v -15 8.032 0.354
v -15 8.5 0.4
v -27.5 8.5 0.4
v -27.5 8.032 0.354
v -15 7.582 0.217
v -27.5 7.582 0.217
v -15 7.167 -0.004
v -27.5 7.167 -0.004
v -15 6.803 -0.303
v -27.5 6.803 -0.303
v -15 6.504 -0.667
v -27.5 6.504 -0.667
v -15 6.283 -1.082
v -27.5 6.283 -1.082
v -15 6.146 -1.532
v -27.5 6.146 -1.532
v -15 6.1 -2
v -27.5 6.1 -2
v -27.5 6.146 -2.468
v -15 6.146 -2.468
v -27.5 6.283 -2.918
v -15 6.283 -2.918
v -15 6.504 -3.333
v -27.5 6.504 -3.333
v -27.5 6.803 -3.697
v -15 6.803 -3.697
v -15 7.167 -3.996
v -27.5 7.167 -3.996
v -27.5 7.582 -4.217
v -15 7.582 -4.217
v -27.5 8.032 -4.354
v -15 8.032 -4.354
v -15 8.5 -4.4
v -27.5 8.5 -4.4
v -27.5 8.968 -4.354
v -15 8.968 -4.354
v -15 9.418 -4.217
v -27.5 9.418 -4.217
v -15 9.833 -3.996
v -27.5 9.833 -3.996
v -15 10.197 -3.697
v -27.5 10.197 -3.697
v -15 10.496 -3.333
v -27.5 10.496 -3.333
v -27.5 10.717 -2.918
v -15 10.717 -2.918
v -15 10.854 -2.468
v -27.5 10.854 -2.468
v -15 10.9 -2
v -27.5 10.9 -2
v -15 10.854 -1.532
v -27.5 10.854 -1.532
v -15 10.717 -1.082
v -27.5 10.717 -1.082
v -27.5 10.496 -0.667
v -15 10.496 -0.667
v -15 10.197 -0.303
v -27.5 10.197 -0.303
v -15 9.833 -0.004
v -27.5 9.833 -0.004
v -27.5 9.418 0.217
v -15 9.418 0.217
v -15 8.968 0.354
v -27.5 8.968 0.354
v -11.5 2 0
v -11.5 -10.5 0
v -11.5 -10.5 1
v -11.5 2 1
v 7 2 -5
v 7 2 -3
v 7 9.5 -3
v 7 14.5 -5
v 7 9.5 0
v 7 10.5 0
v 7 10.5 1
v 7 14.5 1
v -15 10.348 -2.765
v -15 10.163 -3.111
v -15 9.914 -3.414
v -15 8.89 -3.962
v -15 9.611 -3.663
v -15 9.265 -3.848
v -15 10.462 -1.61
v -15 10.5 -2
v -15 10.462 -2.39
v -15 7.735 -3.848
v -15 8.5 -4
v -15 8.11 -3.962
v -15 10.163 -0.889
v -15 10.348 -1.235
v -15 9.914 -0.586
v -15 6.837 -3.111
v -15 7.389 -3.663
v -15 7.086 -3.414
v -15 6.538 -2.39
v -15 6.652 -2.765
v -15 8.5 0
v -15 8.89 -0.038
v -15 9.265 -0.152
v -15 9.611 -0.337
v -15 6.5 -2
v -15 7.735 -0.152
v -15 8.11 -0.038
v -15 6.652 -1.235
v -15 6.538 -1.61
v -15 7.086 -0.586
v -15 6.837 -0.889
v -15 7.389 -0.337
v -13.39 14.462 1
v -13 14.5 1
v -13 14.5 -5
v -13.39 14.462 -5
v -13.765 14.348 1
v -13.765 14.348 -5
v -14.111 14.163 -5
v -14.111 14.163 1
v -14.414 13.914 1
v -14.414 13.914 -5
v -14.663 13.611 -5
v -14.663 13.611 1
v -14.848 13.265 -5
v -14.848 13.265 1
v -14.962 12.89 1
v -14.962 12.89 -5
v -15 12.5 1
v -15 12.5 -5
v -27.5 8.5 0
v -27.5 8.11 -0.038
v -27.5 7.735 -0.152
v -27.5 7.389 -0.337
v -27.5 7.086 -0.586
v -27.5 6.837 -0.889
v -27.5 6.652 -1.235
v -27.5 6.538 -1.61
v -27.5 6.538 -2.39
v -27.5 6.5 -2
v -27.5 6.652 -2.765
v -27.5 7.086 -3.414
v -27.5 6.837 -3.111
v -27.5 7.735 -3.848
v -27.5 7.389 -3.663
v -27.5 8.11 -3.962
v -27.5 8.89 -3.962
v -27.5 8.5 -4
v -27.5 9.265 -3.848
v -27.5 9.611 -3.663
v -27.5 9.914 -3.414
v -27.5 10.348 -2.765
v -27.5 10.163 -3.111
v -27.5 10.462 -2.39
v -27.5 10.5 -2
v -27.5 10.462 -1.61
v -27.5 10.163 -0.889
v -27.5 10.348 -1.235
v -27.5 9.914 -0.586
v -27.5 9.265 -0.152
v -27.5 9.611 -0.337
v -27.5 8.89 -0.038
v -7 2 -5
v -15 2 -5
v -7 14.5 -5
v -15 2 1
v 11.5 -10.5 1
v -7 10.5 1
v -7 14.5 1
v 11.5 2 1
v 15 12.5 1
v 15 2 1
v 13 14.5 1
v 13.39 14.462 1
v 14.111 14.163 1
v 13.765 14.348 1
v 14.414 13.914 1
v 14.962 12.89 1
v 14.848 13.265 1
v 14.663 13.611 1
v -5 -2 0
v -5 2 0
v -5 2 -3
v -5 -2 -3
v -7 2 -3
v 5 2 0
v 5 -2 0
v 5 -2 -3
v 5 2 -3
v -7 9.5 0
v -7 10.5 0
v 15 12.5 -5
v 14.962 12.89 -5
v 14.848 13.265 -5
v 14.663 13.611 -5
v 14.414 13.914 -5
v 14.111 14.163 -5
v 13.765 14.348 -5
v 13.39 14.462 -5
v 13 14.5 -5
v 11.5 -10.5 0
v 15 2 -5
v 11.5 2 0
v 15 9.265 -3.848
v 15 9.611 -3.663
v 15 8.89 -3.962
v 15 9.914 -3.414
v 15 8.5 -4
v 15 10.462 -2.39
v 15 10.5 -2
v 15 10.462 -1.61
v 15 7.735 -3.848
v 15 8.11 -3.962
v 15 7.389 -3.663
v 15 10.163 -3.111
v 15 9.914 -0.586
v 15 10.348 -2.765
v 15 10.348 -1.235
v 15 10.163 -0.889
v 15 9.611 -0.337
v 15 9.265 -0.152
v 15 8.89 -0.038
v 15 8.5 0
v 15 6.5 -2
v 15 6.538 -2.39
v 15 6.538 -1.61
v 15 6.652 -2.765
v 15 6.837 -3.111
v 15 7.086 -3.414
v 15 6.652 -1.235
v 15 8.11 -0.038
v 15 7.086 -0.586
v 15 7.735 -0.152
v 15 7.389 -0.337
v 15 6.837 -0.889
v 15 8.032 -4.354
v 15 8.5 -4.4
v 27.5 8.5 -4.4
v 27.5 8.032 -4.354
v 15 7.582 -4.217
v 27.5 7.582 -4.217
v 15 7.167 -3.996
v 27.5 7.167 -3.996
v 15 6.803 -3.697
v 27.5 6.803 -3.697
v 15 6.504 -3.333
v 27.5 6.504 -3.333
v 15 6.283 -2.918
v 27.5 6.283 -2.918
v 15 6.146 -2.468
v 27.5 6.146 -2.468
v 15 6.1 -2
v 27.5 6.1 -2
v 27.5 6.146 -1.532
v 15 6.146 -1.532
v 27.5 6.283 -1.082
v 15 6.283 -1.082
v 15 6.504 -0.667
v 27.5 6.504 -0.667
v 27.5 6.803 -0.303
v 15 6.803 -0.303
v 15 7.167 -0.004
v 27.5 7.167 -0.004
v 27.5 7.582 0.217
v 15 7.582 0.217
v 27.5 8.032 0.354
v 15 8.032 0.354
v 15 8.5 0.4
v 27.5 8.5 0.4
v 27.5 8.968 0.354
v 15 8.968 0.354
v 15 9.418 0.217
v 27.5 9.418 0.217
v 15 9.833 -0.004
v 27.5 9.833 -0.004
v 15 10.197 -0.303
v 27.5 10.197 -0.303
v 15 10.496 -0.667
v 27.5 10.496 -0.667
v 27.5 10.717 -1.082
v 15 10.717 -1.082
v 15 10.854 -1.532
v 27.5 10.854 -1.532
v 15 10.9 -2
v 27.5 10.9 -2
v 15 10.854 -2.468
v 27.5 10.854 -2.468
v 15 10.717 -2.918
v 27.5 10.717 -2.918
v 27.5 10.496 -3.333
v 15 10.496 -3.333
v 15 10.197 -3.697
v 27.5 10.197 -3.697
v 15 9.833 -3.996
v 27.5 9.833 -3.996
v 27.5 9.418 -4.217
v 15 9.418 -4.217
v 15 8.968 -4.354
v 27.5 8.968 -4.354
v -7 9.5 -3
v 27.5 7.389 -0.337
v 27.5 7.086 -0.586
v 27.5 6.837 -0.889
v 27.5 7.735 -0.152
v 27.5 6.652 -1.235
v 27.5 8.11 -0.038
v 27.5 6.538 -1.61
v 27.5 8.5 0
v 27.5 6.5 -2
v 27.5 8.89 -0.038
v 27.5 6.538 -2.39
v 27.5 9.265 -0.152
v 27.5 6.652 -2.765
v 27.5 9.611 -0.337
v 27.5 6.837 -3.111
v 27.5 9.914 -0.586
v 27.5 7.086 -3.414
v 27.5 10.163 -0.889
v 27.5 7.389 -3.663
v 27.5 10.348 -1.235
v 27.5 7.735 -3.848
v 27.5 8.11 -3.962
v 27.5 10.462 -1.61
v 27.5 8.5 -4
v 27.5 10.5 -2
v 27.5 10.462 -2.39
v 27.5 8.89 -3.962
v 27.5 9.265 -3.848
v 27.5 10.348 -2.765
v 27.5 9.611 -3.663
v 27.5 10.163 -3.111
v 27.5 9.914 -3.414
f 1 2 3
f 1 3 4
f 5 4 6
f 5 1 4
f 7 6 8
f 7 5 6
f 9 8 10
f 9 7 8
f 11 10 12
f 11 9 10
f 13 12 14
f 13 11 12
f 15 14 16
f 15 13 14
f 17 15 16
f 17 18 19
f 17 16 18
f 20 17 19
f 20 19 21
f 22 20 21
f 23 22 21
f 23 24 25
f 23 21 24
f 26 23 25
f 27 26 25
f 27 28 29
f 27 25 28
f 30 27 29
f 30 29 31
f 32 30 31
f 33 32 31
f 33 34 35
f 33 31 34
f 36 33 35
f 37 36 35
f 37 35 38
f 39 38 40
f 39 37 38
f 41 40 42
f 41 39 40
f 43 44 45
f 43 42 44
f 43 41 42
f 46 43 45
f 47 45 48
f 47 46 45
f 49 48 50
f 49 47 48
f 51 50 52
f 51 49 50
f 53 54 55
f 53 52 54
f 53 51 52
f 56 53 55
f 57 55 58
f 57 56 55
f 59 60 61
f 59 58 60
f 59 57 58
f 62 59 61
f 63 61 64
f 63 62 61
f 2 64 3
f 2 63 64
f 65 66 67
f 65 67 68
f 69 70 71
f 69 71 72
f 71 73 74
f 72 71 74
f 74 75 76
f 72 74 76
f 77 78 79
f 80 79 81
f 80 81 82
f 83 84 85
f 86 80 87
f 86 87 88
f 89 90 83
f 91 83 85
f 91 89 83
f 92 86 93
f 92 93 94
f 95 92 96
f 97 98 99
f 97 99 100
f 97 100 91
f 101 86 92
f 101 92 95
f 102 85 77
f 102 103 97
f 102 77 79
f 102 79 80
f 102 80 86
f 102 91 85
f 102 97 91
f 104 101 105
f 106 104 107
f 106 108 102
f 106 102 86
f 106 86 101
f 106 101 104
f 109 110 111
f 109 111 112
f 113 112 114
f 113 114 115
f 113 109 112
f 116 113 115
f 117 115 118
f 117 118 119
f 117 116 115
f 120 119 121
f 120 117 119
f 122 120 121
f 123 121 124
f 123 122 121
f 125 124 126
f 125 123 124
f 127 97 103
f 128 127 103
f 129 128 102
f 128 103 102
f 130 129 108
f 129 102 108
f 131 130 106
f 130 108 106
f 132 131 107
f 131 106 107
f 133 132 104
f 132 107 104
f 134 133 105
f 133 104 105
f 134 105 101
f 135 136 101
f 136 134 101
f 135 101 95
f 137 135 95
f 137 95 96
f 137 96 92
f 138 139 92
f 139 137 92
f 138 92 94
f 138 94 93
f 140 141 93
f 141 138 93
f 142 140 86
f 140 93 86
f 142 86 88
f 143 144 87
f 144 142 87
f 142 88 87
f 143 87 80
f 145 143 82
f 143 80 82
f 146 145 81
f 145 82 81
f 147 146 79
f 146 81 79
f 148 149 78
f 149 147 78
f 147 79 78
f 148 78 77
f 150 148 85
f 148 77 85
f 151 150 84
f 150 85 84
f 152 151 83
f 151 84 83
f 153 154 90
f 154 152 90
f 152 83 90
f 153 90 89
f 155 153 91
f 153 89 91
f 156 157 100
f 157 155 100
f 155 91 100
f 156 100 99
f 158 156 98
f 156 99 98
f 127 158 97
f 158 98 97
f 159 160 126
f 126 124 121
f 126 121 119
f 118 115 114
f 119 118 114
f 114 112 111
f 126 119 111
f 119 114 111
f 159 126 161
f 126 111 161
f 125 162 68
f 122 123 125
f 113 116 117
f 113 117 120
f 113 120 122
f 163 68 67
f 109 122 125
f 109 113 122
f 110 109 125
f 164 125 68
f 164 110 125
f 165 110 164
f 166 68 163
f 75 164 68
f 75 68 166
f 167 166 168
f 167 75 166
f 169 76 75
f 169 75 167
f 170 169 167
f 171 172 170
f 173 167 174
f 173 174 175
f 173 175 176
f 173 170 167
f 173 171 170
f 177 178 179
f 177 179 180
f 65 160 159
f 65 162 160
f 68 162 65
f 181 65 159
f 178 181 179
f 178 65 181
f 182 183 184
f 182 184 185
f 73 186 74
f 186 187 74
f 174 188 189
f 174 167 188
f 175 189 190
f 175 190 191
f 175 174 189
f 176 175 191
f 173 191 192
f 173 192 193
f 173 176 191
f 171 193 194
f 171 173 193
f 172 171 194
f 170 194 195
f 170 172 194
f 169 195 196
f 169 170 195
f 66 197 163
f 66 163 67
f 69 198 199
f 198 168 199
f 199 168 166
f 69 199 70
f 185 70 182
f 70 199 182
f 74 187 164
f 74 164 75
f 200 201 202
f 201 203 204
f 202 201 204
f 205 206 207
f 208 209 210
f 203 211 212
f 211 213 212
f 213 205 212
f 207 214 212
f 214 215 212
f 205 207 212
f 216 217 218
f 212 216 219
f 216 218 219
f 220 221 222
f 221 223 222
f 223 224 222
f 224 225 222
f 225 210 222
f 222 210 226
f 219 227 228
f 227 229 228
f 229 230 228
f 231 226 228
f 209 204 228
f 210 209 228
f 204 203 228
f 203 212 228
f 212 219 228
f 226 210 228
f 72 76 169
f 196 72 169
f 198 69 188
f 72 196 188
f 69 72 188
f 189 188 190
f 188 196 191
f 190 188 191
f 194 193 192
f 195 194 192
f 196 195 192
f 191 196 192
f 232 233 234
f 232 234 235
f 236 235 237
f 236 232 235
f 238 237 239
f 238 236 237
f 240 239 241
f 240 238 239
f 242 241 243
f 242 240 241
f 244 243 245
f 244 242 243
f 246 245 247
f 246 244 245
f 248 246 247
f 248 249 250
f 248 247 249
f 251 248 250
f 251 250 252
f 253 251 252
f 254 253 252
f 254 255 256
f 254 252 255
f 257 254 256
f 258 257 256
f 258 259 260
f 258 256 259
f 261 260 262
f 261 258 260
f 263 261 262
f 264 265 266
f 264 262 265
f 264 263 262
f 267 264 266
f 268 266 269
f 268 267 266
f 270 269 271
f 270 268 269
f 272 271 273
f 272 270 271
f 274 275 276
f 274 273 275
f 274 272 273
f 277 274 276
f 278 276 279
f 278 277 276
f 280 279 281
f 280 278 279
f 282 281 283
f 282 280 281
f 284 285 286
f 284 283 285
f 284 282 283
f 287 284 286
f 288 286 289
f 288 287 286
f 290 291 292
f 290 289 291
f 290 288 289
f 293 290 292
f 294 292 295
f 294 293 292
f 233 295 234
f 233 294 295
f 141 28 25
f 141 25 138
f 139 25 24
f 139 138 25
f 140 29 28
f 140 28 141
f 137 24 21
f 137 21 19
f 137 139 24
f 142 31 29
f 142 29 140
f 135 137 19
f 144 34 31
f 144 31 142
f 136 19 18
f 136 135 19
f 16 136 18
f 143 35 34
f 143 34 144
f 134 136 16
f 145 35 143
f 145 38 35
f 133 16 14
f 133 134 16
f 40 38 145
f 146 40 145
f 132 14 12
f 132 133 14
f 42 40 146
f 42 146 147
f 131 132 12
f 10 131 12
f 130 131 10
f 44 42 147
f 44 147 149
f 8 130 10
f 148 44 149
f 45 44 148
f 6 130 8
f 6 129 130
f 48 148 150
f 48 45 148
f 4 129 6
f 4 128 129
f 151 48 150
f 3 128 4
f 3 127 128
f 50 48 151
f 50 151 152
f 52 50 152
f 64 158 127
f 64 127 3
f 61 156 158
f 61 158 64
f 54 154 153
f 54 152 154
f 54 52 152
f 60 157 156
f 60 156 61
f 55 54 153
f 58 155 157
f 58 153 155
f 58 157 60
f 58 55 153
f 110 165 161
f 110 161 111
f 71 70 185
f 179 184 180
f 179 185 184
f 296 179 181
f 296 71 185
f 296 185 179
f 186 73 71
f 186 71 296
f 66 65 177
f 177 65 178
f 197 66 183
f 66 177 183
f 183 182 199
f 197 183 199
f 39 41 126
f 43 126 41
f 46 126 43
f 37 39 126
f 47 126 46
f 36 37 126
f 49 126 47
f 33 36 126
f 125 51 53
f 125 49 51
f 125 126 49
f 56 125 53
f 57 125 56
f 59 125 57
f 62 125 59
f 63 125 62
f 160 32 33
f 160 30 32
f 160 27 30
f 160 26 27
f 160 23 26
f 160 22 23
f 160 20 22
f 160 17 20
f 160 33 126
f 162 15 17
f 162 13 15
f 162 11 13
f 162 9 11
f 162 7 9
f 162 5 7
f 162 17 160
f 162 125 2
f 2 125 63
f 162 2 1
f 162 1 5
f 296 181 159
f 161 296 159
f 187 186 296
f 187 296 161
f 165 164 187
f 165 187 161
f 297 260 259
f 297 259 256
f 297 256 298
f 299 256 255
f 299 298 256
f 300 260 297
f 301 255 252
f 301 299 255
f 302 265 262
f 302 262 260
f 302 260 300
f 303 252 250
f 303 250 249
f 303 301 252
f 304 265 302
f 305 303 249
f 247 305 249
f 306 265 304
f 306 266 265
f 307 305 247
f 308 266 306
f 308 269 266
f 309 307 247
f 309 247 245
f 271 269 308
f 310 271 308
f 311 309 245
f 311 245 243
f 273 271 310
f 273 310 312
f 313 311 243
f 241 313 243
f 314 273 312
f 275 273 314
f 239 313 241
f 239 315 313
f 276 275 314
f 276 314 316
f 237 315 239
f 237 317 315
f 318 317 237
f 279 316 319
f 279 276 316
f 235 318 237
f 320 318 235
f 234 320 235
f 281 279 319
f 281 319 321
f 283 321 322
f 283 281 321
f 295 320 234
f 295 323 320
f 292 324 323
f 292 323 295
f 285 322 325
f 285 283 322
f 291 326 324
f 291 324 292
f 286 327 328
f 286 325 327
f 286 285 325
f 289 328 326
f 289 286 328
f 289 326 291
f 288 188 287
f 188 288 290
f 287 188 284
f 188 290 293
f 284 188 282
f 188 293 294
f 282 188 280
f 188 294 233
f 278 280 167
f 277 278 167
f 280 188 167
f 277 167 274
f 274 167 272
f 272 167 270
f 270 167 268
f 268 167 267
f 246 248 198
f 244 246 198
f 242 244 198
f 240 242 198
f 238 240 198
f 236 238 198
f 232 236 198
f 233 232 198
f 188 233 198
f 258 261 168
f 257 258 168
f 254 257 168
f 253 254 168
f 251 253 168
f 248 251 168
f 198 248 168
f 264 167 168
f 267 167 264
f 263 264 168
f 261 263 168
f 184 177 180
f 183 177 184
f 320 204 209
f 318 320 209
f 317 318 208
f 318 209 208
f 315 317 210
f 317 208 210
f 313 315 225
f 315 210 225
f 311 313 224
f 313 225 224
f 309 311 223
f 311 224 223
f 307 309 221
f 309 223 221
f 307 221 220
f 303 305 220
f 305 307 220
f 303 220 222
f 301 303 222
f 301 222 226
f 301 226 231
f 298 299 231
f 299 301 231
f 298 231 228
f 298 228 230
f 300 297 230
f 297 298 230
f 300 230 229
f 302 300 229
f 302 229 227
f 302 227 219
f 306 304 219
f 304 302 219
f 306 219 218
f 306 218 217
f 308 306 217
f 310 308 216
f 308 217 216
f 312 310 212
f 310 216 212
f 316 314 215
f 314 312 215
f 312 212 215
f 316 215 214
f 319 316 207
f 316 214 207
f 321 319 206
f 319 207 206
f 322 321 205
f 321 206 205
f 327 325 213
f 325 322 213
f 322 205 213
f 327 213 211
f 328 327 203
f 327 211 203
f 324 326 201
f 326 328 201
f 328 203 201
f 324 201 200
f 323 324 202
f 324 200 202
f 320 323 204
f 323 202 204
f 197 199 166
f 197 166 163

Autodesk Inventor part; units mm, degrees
ref_plane "YZ Plane" through (0, 0, 0) normal (1, 0, 0) x (0, 1, 0)
ref_plane "XZ Plane" through (0, 0, 0) normal (0, 1, 0) x (-1, 0, 0)
ref_plane "XY Plane" through (0, 0, 0) normal (0, 0, 1) x (1, 0, 0)
sketch "Sketch2" plane through (0, 0, 0) normal (0, 0, 1) x (1, 0, 0)
  line L0 (11.5, -10.5) -> (-11.5, -10.5)
  line L1 (-11.5, -10.5) -> (-11.5, 10.5)
  line L2 (-11.5, 10.5) -> (11.5, 10.5)
  line L3 (11.5, 10.5) -> (11.5, -10.5)
  line L4 (11.5, -10.5) -> (-11.5, 10.5) construction
  line L5 (-11.5, -10.5) -> (11.5, 10.5) construction
  point P0 (0, 0)
  dimension "d0" = 23
  dimension "d1" = 21
extrude "Extrusion1" add sketch "Sketch2" along normal blind 1
sketch "Sketch3" plane through (0, 0, 1) normal (0, 0, 1) x (1, 0, 0)
  line L0 (-7, 14.5) -> (-13, 14.5)
  line L1 (-15, 12.5) -> (-15, 2)
  line L2 (-15, 2) -> (-7, 2)
  line L3 (-7, 2) -> (-7, 14.5)
  line L4 (7, 14.5) -> (13, 14.5)
  line L5 (15, 12.5) -> (15, 2)
  line L6 (15, 2) -> (7, 2)
  line L7 (7, 2) -> (7, 14.5)
  line L8 (-7, 14.5) -> (7, 14.5) construction
  line L9 (0, 14.5) -> (0, 0) construction
  arc A0 (-13, 14.5) -> (-15, 12.5) centre (-13, 12.5) ccw
  arc A1 (15, 12.5) -> (13, 14.5) centre (13, 12.5) ccw
  line L10 (11.5, -10.5) -> (-11.5, -10.5) projected
  dimension "d5" = 14
  dimension "d6" = 8
  dimension "d7" = 8
  dimension "d9" = 12.5
  dimension "d10" = 2
  dimension "d20" = 12.5
extrude "Extrusion2" add sketch "Sketch3" against normal blind 6
sketch "Sketch6" plane through (0, 0, 0) normal (0, 0, -1) x (-1, 0, 0)
  line L0 (-7, 9.5) -> (7, 9.5)
  line L1 (7, 9.5) -> (7, 2)
  line L2 (7, 2) -> (-7, 2)
  line L3 (-7, 2) -> (-7, 9.5)
  line L4 (-5, 2) -> (5, 2)
  line L5 (5, 2) -> (5, -2)
  line L6 (5, -2) -> (-5, -2)
  line L7 (-5, -2) -> (-5, 2)
  line L8 (-7, 10.5) -> (-7, 2) projected
  line L9 (7, 10.5) -> (-7, 10.5) projected
  point P0 (0, 0)
  dimension "d23" = 4
  dimension "d27" = 2
  dimension "d28" = 1
  dimension "d29" = 2
extrude "Extrusion5" add sketch "Sketch6" along normal blind 3
sketch "Sketch4" plane through (15, 2, 1) normal (1, 0, 0) x (0, 0, -1)
  line L0 (0, 10.5) -> (6, 10.5) projected
  line L1 (3, 10.5) -> (3, 2.5) construction
  circle A0 centre (3, 6.5) radius 2.4
  circle A1 centre (3, 6.5) radius 2
  point P0 (1, -2)
  point P1 (0, 8)
  dimension "d13" = 4.8
  dimension "d14" = 4
  dimension "d15" = 4
extrude "Extrusion3" add sketch "Sketch4" along normal blind 12.5
sketch "Sketch5" plane through (-15, 2, 1) normal (-1, 0, 0) x (0, 0, 1)
  circle A0 centre (-3, 6.5) radius 2.4 projected
  circle A1 centre (-3, 6.5) radius 2 projected
  point P0 (-1, -2)
extrude "Extrusion4" add sketch "Sketch5" along normal blind 12.5
properties part number "flowMeter"
